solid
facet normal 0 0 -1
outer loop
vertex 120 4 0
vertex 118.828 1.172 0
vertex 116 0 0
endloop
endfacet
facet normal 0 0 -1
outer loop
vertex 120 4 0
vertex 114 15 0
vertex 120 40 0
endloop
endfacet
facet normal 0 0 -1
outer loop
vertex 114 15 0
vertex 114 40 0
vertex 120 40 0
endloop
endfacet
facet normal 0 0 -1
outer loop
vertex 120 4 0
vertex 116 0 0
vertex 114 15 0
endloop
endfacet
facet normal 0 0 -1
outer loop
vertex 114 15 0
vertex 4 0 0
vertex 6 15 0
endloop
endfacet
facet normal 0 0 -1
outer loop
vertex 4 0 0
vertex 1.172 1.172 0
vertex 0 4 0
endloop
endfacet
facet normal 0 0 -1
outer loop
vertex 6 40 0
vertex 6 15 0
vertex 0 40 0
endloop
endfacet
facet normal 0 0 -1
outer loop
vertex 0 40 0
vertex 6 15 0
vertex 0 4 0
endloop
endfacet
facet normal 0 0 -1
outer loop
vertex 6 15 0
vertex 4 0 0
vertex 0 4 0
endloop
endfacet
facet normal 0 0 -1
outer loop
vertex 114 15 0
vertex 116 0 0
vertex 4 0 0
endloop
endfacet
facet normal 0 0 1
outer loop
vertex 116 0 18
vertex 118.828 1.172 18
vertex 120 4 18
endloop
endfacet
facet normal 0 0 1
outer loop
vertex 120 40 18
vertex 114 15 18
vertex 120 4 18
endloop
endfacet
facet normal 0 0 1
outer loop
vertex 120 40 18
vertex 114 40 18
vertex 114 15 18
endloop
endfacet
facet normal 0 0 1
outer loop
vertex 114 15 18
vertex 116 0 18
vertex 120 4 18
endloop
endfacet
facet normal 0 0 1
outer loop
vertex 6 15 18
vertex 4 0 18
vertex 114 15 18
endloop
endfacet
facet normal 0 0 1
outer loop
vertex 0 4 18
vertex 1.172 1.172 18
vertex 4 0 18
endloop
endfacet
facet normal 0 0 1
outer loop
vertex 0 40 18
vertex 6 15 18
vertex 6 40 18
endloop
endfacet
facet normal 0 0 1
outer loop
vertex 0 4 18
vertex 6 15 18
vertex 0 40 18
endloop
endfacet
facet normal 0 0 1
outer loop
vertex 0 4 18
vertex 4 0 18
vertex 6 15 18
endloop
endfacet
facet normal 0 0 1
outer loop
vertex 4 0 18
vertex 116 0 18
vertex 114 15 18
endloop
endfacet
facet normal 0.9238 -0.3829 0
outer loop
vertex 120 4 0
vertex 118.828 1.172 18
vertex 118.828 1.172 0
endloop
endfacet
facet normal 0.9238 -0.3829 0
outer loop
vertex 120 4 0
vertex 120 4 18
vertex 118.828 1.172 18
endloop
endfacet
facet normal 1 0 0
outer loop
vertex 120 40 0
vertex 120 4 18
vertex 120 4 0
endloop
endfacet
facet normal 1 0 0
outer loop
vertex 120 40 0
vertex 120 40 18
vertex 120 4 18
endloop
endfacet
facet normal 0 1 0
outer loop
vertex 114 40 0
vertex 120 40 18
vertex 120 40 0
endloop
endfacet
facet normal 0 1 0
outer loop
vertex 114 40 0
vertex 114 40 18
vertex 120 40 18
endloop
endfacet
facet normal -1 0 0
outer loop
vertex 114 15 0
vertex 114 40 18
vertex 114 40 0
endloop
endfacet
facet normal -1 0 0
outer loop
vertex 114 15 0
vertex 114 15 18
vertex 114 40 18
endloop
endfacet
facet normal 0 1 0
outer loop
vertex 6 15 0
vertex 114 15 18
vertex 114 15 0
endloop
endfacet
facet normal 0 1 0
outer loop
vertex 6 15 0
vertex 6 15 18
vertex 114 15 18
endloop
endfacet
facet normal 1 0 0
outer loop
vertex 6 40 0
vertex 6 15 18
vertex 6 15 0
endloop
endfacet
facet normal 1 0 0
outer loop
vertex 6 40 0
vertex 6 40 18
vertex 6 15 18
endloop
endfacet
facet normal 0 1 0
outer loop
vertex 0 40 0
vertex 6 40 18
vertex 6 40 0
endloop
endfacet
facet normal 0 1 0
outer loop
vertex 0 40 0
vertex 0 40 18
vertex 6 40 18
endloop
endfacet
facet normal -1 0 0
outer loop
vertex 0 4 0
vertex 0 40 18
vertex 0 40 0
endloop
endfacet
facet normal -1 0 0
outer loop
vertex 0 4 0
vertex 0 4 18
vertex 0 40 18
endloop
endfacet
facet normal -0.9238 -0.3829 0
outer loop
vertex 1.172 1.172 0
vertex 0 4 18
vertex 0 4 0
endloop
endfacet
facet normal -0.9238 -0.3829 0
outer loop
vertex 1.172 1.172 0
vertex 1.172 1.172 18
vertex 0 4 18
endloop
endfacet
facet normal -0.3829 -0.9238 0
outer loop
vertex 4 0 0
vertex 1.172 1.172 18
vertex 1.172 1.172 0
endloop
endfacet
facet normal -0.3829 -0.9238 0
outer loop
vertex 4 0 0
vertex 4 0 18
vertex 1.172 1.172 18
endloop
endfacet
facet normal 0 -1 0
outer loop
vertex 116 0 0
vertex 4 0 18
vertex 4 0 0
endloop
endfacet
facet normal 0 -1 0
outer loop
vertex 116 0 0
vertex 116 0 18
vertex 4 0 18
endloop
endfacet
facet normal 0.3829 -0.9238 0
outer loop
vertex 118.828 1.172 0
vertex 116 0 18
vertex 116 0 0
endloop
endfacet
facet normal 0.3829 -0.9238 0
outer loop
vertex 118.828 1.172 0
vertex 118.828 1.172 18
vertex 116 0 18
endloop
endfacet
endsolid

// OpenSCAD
$fn = 32;

// ----------------------------------------------------------------------
// Heat sink frame: 120 x 40 mm frame, 6 mm walls
// ----------------------------------------------------------------------

// --- parameters (mm) ---
profile_height = 18;      // extrusion height
profile_points = 12;      // points of the closed outline

profile = [[0, 4], [1.172, 1.172], [4, 0], [116, 0], [118.828, 1.172], [120, 4], [120, 40], [114, 40], [114, 15], [6, 15], [6, 40], [0, 40]];  // single closed polygon, 12 points, counter clockwise

// --- the one profile operation ---
linear_extrude(height = profile_height) polygon(points = profile);
